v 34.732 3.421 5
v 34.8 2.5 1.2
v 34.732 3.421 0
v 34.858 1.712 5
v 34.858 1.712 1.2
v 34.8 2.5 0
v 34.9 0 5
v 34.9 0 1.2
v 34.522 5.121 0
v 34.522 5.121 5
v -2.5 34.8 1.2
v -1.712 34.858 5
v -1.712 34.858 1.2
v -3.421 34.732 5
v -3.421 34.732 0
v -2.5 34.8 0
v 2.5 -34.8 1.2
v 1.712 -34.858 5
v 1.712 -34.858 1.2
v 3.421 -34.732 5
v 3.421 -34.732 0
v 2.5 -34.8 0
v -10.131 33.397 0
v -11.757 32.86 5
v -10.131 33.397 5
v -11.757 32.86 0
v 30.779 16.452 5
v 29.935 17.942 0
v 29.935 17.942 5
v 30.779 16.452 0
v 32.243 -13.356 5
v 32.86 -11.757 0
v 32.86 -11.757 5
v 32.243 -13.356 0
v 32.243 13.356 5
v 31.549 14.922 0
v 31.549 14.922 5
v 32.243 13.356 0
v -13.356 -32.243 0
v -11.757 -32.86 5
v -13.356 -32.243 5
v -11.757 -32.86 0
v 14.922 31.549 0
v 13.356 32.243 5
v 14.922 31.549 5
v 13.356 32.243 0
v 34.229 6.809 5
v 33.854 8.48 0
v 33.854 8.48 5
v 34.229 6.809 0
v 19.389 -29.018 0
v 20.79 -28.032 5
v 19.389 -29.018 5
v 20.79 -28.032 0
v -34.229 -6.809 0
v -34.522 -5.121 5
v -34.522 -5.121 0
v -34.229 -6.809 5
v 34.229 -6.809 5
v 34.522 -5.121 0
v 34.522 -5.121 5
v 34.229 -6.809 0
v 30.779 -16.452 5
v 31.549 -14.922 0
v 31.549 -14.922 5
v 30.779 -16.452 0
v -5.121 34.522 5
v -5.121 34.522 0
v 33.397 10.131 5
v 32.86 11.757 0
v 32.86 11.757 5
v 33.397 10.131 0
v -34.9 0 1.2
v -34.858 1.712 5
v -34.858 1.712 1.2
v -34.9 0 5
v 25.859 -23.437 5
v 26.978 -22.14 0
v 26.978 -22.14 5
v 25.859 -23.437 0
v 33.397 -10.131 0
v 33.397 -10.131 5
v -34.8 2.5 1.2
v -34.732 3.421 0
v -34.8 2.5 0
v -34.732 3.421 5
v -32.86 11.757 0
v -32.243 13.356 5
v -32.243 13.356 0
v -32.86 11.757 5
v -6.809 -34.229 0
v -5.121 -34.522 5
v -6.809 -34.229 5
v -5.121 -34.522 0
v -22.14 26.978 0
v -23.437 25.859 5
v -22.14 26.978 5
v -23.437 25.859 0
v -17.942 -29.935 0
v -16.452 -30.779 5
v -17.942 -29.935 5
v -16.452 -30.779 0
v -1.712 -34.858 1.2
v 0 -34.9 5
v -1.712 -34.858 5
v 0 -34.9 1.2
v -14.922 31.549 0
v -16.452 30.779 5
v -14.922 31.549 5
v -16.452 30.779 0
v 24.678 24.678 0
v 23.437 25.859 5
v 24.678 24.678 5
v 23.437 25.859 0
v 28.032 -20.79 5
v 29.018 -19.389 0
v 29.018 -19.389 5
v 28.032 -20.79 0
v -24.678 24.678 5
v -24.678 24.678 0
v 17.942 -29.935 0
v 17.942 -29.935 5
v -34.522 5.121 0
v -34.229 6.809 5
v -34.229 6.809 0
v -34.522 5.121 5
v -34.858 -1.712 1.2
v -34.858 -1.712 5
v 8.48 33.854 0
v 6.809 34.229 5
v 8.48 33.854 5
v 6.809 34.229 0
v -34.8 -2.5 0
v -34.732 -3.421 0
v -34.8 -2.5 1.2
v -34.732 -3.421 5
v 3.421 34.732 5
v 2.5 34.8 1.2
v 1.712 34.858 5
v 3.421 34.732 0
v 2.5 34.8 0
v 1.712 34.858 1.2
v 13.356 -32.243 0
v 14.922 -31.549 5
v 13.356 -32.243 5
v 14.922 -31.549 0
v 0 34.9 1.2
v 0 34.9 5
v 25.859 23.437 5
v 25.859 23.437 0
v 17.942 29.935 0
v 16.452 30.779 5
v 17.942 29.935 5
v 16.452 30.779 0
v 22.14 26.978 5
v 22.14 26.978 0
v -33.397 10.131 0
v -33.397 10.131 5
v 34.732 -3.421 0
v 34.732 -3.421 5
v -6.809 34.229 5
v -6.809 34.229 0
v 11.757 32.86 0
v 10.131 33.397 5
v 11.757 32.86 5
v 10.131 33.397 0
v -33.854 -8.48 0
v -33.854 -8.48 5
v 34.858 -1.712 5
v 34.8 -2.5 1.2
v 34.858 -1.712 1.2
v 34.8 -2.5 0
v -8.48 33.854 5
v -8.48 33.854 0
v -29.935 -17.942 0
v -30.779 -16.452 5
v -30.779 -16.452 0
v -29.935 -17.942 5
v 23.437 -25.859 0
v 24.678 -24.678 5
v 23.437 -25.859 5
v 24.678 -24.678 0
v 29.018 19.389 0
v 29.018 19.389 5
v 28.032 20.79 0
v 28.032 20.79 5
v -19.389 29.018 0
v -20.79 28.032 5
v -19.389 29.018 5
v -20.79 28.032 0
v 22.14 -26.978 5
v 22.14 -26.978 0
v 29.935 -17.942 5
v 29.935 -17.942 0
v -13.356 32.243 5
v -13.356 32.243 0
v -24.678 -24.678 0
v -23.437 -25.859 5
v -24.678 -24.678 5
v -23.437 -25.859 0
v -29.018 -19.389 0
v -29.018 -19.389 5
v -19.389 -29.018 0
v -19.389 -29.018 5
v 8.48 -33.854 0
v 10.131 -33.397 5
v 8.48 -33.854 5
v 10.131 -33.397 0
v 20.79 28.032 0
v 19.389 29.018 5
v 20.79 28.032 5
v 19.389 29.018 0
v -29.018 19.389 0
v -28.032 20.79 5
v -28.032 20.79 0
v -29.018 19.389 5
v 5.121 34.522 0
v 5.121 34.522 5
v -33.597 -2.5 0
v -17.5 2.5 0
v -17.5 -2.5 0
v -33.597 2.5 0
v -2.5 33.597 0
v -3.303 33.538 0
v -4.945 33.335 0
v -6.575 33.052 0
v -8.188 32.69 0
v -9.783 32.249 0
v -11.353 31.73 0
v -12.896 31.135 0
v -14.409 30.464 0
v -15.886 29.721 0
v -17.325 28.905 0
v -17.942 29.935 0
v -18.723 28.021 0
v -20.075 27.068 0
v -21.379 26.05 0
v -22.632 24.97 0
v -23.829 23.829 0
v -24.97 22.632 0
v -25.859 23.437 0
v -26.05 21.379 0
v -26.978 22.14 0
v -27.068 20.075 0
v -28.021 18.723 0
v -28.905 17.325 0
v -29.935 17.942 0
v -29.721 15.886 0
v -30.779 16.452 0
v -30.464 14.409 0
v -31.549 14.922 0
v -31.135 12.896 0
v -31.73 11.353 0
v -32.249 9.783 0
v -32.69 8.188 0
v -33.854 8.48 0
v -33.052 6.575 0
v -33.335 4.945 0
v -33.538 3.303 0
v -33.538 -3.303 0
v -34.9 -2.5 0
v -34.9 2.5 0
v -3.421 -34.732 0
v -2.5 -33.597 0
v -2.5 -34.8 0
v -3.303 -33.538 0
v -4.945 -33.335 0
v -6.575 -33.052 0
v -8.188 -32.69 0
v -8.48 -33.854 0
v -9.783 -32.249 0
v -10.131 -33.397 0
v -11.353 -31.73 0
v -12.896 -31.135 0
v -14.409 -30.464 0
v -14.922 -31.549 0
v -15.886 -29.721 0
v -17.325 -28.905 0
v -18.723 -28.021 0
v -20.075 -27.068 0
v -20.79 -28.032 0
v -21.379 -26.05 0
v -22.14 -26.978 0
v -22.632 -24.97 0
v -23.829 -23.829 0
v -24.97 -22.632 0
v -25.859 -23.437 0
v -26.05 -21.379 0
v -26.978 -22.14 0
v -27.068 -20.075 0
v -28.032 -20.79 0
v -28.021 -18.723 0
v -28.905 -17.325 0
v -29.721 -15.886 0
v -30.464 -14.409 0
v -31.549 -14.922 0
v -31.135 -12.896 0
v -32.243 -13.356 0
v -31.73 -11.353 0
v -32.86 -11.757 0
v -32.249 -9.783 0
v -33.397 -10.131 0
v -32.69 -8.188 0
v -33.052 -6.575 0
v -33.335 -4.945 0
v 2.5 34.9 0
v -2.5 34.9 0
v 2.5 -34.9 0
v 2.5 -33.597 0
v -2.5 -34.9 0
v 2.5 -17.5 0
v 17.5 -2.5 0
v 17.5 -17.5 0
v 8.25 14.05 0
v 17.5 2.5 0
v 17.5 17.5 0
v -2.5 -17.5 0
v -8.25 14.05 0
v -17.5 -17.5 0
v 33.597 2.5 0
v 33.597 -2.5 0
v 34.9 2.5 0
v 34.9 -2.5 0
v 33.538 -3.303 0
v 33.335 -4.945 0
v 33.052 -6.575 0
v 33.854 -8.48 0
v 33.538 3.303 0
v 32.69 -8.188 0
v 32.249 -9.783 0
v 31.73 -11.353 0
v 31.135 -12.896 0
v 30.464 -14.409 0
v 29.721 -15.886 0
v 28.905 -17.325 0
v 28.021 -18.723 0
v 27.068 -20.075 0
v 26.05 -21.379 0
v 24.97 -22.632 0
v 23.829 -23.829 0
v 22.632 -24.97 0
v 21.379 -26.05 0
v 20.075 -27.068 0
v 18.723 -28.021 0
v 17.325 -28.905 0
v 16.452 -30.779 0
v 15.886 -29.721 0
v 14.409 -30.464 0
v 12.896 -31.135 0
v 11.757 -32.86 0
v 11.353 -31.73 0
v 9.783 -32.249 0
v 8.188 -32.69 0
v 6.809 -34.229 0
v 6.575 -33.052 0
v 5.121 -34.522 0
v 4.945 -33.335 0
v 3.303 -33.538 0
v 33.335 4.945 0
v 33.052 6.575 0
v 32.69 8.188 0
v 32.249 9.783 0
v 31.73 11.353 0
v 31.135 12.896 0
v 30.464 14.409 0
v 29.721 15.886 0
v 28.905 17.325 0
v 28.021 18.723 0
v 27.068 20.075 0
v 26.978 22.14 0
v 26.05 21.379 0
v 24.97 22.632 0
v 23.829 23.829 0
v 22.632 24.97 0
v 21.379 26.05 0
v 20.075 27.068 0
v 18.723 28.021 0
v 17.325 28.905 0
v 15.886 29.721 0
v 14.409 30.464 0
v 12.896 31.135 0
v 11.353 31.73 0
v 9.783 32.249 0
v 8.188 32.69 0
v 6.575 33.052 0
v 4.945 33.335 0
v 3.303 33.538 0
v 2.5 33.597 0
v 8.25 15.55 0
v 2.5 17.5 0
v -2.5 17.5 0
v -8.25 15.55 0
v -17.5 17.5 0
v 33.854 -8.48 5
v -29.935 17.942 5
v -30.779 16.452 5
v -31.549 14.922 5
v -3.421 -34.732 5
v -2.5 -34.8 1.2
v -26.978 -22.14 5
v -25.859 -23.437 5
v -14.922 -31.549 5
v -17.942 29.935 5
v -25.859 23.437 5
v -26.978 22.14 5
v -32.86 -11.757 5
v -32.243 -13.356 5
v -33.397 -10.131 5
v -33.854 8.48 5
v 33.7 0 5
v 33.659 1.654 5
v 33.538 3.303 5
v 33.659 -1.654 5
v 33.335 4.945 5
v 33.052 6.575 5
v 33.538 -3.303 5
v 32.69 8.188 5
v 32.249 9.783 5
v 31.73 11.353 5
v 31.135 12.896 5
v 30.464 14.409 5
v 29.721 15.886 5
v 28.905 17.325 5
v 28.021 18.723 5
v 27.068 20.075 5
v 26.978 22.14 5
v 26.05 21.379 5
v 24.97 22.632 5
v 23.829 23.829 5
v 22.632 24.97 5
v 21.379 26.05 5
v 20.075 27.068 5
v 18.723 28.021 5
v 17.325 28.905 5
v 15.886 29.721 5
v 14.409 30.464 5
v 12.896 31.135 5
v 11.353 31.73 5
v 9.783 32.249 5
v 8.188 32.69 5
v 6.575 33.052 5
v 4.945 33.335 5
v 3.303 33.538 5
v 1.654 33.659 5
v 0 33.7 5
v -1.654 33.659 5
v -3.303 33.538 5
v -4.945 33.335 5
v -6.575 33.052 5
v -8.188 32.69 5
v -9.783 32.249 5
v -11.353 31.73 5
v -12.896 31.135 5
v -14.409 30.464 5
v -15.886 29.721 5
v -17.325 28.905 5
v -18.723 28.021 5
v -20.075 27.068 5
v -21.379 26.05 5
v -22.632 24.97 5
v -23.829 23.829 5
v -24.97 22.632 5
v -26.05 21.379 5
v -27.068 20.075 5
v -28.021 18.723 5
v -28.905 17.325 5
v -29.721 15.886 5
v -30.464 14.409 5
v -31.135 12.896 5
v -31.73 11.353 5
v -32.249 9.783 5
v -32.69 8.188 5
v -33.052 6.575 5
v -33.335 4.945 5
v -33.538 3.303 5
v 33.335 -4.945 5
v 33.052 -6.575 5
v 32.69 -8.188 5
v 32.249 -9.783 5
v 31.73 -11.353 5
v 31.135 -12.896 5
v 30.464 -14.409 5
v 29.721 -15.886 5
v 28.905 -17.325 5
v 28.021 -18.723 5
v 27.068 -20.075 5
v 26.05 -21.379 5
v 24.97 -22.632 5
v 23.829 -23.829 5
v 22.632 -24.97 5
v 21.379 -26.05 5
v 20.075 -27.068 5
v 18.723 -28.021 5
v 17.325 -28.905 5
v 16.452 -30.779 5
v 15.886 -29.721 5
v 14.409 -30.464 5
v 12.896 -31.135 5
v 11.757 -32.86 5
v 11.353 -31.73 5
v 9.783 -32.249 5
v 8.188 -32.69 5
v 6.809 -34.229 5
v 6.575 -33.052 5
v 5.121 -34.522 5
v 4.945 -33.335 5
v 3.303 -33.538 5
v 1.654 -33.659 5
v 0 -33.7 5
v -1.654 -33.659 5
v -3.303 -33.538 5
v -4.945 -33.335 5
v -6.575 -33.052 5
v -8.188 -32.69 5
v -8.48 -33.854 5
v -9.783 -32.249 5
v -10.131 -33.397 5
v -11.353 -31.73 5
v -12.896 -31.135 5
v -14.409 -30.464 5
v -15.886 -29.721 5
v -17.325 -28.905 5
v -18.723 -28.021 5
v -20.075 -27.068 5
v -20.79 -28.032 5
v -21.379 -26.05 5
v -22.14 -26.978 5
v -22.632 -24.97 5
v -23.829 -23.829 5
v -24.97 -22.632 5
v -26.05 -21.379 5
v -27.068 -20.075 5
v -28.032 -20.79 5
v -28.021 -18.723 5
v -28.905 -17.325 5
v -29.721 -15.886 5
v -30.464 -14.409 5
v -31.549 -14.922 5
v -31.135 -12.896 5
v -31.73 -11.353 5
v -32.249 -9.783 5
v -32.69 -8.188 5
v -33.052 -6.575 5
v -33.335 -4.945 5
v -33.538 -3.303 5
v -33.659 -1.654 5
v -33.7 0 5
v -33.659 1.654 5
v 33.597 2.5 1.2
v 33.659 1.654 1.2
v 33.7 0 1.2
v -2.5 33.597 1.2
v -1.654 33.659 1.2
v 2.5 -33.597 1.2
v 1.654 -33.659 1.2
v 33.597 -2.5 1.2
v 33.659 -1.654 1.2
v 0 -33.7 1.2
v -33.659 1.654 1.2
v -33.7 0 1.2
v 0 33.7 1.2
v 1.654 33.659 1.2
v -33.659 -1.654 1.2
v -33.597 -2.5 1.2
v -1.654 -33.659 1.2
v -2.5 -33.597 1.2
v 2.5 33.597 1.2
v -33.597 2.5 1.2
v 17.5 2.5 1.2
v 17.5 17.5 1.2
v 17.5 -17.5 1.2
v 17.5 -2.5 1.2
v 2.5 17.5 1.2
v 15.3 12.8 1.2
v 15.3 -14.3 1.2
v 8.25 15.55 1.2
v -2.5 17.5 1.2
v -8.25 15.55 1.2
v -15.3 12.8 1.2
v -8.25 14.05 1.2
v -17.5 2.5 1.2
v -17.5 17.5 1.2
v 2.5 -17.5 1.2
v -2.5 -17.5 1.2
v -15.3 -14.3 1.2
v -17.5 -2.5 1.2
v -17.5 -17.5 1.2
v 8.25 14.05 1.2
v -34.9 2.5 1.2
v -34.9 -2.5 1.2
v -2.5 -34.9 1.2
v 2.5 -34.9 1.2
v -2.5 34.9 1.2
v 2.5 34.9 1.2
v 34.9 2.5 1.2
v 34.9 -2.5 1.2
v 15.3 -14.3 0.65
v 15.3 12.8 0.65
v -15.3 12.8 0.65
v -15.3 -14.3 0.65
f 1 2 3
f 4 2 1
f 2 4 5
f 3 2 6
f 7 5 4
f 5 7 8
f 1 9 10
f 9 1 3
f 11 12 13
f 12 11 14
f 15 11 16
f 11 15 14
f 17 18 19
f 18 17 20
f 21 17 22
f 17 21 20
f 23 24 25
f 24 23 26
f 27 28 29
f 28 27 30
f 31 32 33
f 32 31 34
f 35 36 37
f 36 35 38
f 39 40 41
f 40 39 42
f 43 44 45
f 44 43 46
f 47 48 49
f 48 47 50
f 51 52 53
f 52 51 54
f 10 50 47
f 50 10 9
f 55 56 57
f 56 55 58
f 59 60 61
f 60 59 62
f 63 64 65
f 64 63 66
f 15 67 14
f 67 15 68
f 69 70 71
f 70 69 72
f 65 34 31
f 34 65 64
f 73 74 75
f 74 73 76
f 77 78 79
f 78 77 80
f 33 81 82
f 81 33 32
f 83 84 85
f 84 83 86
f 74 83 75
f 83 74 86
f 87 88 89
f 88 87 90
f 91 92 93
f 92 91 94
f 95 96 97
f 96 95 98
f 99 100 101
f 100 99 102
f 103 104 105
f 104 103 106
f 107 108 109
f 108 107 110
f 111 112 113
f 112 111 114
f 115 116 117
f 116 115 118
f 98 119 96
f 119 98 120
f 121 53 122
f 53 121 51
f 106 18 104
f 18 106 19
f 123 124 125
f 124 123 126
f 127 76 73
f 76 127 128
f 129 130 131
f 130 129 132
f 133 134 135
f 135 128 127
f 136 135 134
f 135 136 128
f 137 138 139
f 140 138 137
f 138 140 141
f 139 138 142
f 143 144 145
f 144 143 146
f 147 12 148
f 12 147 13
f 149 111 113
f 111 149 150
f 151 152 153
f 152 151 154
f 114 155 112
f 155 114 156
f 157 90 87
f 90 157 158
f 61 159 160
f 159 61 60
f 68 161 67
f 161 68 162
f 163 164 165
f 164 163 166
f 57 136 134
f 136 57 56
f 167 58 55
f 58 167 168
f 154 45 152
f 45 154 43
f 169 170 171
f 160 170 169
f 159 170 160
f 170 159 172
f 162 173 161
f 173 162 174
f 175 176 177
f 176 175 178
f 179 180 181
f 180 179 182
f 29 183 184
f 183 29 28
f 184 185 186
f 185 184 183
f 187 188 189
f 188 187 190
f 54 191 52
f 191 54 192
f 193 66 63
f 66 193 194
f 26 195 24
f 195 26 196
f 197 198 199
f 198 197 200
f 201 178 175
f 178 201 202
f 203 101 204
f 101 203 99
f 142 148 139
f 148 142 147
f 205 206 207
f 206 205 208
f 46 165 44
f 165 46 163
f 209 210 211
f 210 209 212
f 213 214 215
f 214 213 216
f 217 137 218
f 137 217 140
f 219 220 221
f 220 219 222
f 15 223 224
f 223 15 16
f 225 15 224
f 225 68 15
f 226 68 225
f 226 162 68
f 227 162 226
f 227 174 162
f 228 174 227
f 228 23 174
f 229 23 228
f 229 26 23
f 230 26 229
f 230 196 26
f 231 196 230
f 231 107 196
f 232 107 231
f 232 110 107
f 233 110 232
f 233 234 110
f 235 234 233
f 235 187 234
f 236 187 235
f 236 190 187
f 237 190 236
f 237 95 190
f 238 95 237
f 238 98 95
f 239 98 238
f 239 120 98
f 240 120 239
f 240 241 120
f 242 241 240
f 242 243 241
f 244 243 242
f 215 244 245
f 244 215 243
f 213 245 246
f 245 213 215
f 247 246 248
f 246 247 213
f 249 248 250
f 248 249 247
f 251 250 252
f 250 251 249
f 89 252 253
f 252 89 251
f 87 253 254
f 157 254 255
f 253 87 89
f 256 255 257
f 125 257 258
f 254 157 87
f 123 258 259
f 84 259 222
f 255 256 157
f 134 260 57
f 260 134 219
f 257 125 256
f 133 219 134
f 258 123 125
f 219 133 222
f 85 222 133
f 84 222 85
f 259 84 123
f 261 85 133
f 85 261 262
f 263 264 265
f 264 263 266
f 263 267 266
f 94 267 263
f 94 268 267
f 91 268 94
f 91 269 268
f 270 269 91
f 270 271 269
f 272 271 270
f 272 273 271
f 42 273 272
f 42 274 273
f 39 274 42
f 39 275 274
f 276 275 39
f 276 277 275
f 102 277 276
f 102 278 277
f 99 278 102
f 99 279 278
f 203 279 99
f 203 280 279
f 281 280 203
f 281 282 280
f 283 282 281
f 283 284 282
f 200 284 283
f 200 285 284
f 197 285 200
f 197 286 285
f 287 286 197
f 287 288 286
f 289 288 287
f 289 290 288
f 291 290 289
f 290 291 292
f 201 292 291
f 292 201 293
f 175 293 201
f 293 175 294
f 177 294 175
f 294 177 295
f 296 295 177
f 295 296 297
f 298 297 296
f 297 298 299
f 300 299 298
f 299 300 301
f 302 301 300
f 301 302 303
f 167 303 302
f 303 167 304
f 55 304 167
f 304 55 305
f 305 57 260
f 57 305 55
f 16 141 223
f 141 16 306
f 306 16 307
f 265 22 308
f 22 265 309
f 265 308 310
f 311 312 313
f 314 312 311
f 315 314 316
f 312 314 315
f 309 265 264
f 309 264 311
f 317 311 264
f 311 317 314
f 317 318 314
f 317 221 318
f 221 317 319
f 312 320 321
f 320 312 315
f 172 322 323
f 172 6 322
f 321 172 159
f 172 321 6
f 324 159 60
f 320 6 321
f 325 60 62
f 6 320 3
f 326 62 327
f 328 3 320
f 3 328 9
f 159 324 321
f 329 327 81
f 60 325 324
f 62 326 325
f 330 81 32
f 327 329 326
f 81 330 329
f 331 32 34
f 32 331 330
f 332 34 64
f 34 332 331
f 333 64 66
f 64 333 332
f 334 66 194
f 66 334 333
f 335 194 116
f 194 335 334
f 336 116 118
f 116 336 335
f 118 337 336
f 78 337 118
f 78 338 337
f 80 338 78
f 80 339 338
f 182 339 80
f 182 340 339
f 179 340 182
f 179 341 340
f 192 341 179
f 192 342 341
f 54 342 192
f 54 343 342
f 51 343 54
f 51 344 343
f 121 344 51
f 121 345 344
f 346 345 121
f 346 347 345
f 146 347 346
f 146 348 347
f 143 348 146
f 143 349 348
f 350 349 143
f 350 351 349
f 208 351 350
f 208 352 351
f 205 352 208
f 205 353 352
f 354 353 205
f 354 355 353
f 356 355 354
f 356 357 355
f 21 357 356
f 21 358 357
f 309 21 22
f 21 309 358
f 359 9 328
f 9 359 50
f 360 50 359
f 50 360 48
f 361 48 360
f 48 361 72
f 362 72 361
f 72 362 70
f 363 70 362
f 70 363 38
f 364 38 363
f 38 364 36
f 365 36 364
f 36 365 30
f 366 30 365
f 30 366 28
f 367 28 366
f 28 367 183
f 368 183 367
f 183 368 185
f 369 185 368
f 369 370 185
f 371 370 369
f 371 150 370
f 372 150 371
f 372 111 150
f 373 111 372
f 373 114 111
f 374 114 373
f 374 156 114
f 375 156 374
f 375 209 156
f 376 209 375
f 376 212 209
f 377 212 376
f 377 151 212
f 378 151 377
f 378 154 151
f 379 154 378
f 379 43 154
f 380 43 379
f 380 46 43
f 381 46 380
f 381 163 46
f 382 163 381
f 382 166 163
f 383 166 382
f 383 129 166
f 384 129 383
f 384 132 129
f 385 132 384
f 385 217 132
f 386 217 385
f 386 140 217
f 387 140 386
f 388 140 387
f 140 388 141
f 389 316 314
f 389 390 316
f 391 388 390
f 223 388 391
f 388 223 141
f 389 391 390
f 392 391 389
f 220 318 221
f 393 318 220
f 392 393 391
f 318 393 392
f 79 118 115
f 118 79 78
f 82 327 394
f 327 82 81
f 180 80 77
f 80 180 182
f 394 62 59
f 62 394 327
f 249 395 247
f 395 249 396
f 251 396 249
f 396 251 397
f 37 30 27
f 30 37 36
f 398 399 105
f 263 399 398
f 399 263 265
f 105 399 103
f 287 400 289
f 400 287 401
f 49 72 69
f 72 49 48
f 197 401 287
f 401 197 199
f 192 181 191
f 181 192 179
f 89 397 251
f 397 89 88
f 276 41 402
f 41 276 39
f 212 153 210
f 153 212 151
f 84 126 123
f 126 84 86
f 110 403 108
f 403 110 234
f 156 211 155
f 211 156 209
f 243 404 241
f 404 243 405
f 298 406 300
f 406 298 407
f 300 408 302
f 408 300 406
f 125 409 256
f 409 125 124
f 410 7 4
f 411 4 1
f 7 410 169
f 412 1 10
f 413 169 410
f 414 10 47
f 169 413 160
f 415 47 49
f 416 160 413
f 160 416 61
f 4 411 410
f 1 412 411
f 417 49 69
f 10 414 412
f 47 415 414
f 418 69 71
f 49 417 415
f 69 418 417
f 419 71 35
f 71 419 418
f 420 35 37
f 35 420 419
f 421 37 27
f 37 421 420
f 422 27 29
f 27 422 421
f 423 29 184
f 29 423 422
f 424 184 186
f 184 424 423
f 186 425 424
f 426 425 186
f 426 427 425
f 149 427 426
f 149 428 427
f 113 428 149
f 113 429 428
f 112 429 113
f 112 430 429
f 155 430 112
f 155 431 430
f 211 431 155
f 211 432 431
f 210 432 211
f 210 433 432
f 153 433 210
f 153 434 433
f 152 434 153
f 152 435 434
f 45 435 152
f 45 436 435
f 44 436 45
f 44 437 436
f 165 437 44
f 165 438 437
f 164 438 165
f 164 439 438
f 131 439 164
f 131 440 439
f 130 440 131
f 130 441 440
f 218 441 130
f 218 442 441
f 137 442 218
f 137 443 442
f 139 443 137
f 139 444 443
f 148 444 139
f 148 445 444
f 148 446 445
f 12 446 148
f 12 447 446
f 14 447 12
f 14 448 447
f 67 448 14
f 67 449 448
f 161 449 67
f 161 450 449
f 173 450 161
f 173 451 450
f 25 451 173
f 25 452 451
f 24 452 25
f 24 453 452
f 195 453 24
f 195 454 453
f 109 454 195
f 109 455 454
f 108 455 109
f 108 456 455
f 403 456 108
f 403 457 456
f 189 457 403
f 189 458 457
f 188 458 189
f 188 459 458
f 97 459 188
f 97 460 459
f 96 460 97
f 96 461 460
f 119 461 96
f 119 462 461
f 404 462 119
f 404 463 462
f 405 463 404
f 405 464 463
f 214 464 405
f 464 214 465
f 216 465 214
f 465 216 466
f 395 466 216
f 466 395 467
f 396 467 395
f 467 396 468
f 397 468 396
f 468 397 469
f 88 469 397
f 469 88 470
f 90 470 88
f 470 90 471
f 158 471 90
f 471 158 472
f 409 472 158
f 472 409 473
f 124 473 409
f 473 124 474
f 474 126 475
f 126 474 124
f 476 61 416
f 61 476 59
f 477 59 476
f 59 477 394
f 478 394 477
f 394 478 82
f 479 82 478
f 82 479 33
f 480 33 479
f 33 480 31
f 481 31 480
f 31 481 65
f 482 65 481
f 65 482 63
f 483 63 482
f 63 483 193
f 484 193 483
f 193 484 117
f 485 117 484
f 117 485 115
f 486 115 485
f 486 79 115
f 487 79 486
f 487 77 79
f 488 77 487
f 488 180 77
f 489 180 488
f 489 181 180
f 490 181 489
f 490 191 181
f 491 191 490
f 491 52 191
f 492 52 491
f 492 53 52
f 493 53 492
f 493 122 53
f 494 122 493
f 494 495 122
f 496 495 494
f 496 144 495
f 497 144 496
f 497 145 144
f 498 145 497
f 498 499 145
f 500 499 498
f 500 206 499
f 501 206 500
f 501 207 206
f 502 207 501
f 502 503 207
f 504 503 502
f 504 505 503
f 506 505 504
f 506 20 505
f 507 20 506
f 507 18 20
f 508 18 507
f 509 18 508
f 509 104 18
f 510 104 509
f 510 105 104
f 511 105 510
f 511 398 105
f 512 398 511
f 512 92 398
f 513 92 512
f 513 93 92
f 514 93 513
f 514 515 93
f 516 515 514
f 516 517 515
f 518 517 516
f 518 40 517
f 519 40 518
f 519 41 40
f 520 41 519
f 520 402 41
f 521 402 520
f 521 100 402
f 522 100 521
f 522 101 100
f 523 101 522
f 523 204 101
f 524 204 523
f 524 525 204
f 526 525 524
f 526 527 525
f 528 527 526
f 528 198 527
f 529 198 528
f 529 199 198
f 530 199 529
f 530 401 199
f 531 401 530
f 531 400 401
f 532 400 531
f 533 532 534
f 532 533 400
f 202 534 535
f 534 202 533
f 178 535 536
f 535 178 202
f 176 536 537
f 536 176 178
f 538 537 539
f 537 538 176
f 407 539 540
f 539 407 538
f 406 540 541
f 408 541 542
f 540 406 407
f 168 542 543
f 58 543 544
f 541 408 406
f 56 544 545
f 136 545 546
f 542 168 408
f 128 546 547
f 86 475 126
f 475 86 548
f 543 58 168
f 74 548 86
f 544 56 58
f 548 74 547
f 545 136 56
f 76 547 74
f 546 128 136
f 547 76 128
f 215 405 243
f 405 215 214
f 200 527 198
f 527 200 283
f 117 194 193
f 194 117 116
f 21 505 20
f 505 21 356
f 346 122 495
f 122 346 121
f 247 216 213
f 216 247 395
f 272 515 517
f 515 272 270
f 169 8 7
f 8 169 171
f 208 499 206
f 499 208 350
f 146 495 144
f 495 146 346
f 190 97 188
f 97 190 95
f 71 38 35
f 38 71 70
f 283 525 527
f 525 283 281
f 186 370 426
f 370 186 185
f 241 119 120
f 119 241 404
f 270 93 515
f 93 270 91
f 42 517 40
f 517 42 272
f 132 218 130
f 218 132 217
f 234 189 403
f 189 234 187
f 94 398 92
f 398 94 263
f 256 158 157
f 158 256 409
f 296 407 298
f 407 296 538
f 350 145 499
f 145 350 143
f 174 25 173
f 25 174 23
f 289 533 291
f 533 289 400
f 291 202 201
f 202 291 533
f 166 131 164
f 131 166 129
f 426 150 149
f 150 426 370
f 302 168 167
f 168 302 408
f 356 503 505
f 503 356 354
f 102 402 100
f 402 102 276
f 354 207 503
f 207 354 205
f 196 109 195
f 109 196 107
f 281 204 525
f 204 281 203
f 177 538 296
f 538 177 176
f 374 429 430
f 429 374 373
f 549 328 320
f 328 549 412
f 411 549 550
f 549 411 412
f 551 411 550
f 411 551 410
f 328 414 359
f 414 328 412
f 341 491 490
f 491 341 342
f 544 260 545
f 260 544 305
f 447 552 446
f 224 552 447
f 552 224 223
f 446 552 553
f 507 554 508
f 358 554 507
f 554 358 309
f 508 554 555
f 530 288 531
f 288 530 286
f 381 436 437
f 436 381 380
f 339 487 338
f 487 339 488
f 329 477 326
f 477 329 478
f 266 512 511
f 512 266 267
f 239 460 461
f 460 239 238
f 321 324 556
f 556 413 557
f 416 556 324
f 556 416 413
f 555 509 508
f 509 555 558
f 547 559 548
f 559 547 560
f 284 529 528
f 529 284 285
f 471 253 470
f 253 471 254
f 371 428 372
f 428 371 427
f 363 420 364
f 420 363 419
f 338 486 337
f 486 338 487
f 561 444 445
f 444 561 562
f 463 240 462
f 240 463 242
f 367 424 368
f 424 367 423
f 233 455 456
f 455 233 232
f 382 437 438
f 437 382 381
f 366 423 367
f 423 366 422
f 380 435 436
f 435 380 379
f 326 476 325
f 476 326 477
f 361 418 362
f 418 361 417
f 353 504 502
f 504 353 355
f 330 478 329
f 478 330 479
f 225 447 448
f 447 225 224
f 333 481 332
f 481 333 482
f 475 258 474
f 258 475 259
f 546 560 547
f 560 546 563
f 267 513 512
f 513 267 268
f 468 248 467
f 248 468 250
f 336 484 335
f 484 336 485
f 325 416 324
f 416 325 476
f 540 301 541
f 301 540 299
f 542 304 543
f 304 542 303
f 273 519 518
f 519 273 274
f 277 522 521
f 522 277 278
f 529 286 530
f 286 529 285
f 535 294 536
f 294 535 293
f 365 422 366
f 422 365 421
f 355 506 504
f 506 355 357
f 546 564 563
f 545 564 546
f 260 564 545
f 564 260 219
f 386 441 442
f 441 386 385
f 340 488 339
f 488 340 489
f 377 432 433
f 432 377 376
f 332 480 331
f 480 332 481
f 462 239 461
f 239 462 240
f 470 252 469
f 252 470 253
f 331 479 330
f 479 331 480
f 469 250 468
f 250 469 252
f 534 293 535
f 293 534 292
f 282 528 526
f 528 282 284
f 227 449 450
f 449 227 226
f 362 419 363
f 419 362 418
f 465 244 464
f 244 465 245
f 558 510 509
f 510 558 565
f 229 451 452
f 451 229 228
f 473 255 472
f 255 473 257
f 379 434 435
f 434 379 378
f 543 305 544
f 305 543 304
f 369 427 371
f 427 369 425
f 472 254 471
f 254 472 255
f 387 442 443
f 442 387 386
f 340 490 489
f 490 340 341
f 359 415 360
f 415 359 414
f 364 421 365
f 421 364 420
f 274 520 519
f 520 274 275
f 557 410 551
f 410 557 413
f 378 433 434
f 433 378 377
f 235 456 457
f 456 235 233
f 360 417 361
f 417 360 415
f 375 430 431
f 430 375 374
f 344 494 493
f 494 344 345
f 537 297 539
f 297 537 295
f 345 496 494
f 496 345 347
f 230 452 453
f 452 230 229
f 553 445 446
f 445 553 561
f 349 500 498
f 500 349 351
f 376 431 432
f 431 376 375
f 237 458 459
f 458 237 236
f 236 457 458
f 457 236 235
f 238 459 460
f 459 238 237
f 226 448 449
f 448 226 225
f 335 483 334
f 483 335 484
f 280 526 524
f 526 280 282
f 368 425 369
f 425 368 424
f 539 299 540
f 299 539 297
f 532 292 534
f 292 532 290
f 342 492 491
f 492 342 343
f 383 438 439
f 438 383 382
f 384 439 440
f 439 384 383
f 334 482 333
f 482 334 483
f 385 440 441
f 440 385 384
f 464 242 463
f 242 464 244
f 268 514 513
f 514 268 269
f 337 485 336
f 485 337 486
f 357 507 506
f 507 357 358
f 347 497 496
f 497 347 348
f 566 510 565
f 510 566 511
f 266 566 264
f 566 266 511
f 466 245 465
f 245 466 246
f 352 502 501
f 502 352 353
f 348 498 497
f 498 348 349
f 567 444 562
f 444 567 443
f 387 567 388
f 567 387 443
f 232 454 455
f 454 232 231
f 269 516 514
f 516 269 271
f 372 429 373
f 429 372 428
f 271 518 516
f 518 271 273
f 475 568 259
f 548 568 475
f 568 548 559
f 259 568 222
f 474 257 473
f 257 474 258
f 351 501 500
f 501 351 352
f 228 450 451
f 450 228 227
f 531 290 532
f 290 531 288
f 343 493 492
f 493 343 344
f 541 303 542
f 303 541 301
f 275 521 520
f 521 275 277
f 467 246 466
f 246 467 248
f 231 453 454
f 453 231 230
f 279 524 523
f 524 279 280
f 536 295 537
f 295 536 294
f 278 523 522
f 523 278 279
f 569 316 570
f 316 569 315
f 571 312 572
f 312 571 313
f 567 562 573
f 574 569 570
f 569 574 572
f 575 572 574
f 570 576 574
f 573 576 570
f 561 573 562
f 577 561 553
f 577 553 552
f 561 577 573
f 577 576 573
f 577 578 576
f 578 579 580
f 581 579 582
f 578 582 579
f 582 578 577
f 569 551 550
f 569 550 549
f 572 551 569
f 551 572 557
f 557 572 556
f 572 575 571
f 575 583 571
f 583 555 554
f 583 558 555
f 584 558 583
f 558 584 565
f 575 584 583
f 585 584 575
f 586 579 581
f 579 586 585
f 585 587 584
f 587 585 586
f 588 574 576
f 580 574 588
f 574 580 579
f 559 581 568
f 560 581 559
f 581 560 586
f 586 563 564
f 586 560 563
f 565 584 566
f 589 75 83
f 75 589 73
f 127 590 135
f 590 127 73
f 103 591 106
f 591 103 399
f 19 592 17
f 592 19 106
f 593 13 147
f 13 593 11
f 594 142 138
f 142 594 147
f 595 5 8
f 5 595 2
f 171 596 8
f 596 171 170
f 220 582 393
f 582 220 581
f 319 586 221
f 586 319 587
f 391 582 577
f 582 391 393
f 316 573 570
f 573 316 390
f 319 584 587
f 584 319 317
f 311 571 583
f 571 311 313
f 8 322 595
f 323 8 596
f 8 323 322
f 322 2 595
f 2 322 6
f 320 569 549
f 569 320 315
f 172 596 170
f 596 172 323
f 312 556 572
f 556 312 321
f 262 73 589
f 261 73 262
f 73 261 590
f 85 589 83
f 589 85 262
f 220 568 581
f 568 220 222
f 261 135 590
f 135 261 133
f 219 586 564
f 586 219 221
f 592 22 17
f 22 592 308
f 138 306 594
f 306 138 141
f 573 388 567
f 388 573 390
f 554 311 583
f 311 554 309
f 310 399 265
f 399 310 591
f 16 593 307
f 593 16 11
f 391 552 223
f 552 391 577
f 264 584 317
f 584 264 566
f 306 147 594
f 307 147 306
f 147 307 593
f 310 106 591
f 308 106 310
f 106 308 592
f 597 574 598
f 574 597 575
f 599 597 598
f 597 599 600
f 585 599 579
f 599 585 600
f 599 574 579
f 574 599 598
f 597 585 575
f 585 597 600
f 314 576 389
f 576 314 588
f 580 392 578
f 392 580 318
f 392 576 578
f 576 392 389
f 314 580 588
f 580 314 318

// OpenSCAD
diam=69.8;
thk=5;
wth=1.2;

cwid=25;
chgh=24;
cthk=1.5;
cbth=3;
presc=0.8;

lwdt=5;


module tubemount() {

translate([0,0,thk/2])
    difference() {
        cylinder(d=diam, h=thk, $fn=128, center=true);
        cylinder(d=diam-wth*2, h=thk+1, $fn=128, center=true);
    }

difference() {
union() {
translate([0,0,wth/2])
    cube([cwid+10,cwid+10,wth], center=true);
translate([diam/4,0,(wth)/2])
    cube([diam/2,lwdt,wth], center=true);
translate([-diam/4,0,(wth)/2])
    cube([diam/2,lwdt,wth], center=true);
translate([0,diam/4,(wth)/2])
    cube([lwdt,diam/2,wth], center=true);
translate([0,-diam/4,(wth)/2])
    cube([lwdt,diam/2,wth], center=true);
}
union() {
translate([0,-cthk/2,cthk/2+cthk/3])
    cube([cwid+presc*2+2*cthk+1,chgh+presc*2+cthk,wth], center=true);
translate([0,chgh/2+presc+2,cthk/2])
    cube([16.5,1.5,cthk*2], center=true);
}
}

}

module cameramount() {

translate([0,0,(cbth)/2])
difference() {
translate([0,-cthk/2,(cthk+presc+cbth)/2]) 
    cube([cwid+presc*2+2*wth,chgh+wth,cthk+presc+2*wth+cbth], center=true);
translate([0,0,cthk*3/2+cthk]) {
    translate([0,0,(cbth-cthk-presc)/2])
        cube([cwid+presc*2,chgh,cthk+presc], center=true);
    cube([cwid-wth*2,chgh,cthk+presc+wth+cbth], center=true);
}
}
}


tubemount();
//cameramount();
